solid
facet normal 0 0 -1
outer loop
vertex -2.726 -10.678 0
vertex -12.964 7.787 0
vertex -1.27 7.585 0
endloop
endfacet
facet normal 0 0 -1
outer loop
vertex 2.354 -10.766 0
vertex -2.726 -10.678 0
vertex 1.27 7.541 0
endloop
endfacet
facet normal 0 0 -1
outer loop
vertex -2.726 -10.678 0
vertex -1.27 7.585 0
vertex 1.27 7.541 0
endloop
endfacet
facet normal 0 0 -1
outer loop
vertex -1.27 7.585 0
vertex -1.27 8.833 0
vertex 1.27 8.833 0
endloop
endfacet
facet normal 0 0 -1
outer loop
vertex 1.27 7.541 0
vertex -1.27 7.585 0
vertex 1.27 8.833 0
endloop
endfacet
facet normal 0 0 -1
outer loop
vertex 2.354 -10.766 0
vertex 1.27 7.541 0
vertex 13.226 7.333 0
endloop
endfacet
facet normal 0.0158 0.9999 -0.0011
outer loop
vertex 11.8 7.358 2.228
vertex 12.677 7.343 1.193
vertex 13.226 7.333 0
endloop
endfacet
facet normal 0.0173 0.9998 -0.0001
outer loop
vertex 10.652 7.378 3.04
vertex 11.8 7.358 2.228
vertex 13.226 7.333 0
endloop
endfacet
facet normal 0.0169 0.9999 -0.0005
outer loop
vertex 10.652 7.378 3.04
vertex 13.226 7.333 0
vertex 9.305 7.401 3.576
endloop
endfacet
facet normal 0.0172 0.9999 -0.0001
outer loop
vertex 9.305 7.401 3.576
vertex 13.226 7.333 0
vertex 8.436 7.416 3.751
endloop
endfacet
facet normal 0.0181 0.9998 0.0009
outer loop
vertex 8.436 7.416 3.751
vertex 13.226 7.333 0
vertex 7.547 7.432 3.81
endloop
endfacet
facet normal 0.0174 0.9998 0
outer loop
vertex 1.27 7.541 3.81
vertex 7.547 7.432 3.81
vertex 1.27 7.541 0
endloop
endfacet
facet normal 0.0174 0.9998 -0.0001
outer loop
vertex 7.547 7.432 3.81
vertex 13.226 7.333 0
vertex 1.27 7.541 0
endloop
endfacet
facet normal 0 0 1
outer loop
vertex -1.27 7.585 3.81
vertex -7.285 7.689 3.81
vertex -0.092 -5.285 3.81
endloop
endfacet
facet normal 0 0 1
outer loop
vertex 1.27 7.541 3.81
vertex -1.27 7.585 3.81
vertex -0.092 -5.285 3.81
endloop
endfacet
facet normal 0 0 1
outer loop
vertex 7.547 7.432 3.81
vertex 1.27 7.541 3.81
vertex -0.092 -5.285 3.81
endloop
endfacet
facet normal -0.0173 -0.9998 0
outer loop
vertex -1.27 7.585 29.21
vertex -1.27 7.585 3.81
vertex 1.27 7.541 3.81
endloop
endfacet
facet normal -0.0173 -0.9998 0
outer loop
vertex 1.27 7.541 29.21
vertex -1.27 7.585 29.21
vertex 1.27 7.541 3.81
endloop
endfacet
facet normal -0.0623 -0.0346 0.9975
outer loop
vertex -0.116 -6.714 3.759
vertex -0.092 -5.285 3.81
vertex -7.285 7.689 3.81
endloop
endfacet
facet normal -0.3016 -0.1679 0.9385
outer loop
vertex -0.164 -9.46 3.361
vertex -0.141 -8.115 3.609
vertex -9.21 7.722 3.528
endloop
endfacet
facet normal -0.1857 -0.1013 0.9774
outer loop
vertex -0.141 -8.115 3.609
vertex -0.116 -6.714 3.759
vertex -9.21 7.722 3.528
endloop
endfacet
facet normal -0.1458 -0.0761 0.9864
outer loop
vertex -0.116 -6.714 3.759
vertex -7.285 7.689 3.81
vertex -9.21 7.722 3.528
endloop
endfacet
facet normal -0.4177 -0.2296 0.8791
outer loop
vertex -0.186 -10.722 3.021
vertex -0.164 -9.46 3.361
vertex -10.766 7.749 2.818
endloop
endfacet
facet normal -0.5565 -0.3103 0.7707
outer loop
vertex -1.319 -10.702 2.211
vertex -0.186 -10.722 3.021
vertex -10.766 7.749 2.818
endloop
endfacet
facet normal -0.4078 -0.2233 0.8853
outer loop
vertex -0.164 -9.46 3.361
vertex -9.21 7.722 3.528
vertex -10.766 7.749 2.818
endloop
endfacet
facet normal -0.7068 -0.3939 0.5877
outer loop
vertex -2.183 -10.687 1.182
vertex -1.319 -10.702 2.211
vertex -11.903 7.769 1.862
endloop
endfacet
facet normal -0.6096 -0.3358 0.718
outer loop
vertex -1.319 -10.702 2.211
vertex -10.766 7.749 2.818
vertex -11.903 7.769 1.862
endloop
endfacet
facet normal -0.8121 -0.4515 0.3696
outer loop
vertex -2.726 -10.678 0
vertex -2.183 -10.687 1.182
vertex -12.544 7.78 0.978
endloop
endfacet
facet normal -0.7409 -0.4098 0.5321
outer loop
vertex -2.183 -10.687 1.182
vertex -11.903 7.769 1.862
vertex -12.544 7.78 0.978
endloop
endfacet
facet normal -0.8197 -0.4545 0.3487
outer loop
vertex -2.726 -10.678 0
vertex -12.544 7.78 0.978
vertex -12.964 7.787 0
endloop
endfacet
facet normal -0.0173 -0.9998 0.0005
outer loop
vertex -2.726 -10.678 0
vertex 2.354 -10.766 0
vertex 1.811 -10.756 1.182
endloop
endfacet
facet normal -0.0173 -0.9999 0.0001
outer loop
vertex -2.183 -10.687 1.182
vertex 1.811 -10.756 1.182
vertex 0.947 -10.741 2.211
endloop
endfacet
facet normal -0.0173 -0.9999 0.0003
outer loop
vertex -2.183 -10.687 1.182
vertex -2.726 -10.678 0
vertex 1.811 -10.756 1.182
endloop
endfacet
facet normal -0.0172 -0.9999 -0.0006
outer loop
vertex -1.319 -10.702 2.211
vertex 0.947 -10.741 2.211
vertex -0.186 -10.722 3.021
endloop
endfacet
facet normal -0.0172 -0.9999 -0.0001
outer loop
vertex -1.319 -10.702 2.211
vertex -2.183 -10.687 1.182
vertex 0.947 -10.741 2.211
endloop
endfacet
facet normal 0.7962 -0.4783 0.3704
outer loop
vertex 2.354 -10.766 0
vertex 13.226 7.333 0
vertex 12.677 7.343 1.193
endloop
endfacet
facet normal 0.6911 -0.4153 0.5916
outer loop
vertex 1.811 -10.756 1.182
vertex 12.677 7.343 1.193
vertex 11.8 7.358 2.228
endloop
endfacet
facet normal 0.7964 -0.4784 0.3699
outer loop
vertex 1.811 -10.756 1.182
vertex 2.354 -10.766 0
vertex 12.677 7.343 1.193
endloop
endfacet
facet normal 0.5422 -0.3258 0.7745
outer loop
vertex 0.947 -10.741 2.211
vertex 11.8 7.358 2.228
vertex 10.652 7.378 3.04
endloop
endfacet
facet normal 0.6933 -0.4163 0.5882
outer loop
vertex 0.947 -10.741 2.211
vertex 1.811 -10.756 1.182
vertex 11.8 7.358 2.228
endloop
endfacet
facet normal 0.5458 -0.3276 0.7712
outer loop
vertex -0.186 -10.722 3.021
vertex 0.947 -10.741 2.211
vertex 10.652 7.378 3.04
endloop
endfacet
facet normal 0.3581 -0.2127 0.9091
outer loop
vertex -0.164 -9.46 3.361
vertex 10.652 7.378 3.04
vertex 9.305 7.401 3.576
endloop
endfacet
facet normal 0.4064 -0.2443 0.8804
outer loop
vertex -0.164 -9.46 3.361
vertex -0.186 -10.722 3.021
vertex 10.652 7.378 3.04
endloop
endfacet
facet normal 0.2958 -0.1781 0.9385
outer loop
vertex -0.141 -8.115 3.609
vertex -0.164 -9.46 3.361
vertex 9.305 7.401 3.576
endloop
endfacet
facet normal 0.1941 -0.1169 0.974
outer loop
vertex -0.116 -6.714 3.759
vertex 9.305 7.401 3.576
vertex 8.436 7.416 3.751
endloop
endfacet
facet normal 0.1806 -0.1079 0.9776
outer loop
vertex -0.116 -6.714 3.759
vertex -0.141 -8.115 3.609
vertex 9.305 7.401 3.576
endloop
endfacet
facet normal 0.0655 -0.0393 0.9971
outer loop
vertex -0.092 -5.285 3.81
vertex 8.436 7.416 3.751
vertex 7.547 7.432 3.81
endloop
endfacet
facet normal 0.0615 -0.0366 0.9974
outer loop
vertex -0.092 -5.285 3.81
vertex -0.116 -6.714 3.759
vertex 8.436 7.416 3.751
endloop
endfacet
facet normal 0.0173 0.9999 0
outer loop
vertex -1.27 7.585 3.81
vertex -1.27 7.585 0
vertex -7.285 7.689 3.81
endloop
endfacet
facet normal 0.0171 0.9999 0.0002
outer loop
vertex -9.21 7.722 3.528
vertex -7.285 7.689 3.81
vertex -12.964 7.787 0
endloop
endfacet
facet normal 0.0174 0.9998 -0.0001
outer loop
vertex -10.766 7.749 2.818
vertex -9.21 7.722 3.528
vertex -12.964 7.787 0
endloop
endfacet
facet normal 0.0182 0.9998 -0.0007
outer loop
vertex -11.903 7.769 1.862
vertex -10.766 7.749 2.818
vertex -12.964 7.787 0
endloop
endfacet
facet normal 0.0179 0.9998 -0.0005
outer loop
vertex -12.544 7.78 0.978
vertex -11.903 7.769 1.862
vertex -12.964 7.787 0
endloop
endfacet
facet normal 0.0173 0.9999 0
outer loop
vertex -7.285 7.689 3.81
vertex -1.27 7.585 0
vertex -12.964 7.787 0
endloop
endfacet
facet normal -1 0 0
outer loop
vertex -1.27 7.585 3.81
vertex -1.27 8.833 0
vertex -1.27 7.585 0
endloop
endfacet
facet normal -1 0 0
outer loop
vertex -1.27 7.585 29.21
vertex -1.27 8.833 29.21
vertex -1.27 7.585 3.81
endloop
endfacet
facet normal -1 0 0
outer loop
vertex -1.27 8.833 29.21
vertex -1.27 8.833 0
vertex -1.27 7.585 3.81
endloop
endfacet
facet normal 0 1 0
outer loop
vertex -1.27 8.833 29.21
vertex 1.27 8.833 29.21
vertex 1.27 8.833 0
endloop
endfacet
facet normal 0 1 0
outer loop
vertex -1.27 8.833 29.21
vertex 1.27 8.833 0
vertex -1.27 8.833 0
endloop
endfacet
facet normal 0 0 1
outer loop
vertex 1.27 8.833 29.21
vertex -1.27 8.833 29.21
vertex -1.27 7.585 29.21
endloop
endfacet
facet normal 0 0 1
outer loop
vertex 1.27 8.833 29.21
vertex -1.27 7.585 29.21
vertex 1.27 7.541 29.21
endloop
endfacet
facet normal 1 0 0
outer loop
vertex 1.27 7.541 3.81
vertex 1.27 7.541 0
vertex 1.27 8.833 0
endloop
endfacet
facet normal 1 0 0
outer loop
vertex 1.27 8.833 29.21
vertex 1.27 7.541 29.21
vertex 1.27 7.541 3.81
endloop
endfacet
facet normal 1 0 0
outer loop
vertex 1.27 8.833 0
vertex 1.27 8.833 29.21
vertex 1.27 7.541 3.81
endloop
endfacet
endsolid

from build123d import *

# Parameters (mm, degrees)
F1_DEPTH      = 3.81
F2_SIZE       = 5.08
F3_T1_DEPTH   = 45.7068968586
F3_T3_DEPTH   = 45.7068968586
F5_DEPTH      = 25.4
F5_DEPTH_BACK = 3.81


# Not quite as in the source:
# - a fillet or chamfer that OpenCascade refuses, or shapes differently, is made with other operations: its cross-section is extruded or revolved along the edge and cut away or added


with BuildPart() as f1:
    # F0 (on Top) → F1 (new body)
    with BuildSketch(Plane.XY):
        Polygon((-0.2622354642, -15.1205231096), (13.2258748636, 7.3331589811), (-12.9636393994, 7.7873641286), align=None)
    extrude(amount=F1_DEPTH)

    # F2
    f2_edges = [f1.edges().sort_by_distance(p)[0] for p in [
        (-0.262235, -15.120523, 1.905),
    ]]
    chamfer(f2_edges, length=F2_SIZE)

    # F3: fillet of radius 5.08 on 2 edges, made by hand

    # F3_s2 → F3_t1 (cut)
    with BuildSketch(Plane(origin=(-10.4602488885, -17.4131955793, 0), x_dir=(0, 0, 1), z_dir=(0.5149420555, 0.8572249877, 0))):
        with BuildLine():
            ThreePointArc((0, 7.5613984578), (2.7460926284, 5.7535615814), (3.81, 2.6427096081))
            Line((3.81, 2.6427096081), (3.81, 7.5613984578))
            Line((3.81, 7.5613984578), (0, 7.5613984578))
        make_face()
    extrude(amount=F3_T1_DEPTH, mode=Mode.SUBTRACT)

    # F3_s4 → F3_t3 (cut)
    with BuildSketch(Plane(origin=(-12.3134758372, 22.2082312655, 0), x_dir=(0, 0, 1), z_dir=(0.4849075883, -0.8745653954, 0))):
        with BuildLine():
            ThreePointArc((3.81, 2.6427096081), (2.7460926284, 5.7535615814), (0, 7.5613984578))
            Line((0, 7.5613984578), (3.81, 7.5613984578))
            Line((3.81, 7.5613984578), (3.81, 2.6427096081))
        make_face()
    extrude(amount=F3_T3_DEPTH, mode=Mode.SUBTRACT)

    # F4 (on face) → F5 (join, two sides)
    with BuildSketch(Plane.XY.offset(3.81)) as f5_sk:
        Polygon((1.27, 7.5405099022), (1.27, 8.8325355317), (-1.27, 8.8325355317), (-1.27, 7.5845611611), align=None)
    extrude(amount=F5_DEPTH)
    extrude(f5_sk.sketch, amount=-F5_DEPTH_BACK)


solid = f1.part
